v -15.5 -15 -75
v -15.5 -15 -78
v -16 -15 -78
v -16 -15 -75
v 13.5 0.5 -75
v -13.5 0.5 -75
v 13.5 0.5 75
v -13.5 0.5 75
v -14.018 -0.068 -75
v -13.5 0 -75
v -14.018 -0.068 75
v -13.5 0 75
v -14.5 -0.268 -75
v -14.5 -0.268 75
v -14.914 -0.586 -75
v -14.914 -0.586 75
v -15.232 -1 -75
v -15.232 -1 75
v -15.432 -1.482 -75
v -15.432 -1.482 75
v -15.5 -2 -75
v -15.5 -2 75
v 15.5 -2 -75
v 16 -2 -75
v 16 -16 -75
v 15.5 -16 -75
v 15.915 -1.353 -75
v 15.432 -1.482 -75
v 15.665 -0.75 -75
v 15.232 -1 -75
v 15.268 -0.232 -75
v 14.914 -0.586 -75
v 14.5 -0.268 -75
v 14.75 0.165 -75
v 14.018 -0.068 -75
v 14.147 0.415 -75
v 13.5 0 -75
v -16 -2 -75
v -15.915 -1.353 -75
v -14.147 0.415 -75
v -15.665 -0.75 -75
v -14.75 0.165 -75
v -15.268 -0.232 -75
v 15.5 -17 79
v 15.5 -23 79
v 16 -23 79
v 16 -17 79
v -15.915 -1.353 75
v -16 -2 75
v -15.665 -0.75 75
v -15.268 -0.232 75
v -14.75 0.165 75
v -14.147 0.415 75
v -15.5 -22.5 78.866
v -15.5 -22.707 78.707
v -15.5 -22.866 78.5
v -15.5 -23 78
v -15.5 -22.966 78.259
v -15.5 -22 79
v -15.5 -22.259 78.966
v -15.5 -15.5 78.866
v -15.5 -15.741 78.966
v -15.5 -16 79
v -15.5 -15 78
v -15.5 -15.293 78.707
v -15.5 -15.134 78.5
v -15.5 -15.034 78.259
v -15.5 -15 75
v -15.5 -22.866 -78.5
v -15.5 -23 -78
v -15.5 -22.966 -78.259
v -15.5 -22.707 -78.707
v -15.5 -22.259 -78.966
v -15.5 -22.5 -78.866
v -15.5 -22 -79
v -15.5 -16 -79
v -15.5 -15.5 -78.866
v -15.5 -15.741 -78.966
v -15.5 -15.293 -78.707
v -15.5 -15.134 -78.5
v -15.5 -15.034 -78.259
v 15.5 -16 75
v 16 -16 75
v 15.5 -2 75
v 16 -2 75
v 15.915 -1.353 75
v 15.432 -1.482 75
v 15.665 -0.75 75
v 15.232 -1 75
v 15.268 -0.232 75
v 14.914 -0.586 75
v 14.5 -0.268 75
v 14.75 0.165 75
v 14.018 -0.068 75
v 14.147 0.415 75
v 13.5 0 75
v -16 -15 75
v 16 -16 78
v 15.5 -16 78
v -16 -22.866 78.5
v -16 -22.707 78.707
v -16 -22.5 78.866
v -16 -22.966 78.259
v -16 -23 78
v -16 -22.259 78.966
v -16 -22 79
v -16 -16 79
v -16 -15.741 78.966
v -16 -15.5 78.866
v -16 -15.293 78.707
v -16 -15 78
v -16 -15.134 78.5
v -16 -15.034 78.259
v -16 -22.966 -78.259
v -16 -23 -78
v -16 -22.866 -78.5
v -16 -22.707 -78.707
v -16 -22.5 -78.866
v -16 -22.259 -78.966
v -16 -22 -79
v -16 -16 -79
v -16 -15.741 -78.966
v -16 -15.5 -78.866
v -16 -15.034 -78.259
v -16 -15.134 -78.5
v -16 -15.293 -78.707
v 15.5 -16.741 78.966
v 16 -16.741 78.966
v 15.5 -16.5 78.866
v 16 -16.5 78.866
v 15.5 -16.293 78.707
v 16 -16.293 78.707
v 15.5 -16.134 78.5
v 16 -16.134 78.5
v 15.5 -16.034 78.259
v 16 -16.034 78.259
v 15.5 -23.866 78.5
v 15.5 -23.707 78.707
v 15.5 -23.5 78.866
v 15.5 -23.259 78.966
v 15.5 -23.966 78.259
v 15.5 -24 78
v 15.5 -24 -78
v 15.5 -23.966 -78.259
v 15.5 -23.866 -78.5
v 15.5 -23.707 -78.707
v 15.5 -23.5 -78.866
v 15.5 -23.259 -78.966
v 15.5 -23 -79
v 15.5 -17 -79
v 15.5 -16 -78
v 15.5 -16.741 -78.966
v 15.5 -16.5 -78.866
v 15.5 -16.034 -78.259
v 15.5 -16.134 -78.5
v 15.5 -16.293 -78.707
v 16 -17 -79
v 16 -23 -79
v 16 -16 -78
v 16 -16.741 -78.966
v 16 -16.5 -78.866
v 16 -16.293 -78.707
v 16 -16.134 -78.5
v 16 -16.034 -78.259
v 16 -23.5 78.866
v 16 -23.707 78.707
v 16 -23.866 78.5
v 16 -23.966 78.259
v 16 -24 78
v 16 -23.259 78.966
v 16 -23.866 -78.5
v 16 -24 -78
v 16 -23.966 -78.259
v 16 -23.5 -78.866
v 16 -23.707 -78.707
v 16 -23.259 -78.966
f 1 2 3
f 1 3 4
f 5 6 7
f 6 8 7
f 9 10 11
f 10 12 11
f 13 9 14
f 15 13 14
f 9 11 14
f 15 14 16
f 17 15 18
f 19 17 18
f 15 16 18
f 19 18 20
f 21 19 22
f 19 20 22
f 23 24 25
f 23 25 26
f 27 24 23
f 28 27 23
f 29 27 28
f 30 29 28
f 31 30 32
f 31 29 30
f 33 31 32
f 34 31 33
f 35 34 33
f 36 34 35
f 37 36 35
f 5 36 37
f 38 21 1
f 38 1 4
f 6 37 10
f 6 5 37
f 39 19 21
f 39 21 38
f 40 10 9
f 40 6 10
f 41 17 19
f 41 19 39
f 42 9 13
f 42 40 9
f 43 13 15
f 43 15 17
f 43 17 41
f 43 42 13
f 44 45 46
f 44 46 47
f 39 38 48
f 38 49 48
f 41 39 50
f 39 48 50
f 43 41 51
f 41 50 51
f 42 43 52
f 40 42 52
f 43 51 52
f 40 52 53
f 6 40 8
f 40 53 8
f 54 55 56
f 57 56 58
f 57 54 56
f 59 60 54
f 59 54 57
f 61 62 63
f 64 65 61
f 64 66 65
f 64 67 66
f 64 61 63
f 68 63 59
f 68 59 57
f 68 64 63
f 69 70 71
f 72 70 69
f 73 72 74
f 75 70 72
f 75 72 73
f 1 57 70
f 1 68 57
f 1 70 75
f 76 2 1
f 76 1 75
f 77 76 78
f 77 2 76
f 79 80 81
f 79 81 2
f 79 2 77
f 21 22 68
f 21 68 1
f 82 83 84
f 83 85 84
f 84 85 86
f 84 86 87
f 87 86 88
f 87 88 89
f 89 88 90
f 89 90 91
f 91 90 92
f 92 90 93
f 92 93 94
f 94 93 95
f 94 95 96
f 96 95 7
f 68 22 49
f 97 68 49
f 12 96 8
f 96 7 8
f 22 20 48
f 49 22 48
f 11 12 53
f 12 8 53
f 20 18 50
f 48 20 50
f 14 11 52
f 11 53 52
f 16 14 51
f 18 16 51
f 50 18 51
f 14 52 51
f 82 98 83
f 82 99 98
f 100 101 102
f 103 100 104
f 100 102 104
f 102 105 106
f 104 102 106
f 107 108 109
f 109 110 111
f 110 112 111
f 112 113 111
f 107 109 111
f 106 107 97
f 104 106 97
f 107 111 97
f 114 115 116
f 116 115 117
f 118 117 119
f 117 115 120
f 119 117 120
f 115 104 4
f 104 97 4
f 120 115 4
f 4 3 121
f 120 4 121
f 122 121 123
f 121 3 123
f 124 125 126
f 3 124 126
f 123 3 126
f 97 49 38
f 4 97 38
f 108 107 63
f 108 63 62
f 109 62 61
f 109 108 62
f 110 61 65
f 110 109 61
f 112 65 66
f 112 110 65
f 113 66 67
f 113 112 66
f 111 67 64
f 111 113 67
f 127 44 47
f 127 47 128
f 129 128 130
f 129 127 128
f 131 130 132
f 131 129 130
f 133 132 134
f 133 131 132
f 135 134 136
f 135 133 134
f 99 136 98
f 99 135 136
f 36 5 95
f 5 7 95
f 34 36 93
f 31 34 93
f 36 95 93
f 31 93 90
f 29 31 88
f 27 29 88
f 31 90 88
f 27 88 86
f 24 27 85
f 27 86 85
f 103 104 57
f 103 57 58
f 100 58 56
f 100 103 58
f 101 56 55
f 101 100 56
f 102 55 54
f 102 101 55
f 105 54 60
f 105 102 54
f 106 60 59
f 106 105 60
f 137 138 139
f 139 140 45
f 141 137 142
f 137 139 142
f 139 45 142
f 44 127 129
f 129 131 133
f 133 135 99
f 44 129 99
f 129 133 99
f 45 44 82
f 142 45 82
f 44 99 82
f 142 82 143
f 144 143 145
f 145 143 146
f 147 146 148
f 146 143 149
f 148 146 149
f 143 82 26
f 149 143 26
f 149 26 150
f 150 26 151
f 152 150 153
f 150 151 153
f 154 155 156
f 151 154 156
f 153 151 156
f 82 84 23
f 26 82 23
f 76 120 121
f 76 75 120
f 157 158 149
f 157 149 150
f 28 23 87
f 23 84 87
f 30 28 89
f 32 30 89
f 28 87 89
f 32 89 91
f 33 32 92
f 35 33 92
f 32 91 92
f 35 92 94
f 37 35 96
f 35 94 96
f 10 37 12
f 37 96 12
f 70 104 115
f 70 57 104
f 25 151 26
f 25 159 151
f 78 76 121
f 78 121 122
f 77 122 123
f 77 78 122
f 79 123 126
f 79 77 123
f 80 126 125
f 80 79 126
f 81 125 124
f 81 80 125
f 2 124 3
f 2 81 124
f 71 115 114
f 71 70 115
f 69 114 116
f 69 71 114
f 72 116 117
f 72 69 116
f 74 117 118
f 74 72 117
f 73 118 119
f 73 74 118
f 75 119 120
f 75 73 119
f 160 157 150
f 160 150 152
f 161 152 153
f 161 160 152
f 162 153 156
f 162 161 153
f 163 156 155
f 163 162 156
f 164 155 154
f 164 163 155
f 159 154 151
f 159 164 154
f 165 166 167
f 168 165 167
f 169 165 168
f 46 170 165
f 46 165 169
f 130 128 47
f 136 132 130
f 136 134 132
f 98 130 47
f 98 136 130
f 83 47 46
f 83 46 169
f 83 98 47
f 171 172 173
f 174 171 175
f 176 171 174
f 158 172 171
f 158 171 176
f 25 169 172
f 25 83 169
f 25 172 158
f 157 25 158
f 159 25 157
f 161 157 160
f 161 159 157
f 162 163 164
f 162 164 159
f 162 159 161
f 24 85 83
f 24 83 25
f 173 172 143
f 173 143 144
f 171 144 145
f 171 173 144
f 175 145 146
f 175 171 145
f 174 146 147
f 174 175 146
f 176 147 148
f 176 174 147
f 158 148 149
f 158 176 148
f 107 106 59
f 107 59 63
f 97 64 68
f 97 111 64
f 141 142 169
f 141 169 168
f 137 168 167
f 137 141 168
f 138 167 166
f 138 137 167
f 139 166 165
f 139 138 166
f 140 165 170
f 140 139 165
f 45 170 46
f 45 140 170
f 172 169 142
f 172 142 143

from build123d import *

# Parameters (mm, degrees)
BOSS_EXTRUDE1_DEPTH = 75
BOSS_EXTRUDE2_DEPTH = 0.25
BOSS_EXTRUDE3_DEPTH = 0.25


with BuildPart() as part:
    # Sketch2 → Boss-Extrude1 (new, symmetric)
    with BuildSketch(Plane.XY):
        with BuildLine():
            Line((15.5, -24), (15.5, -2))
            ThreePointArc((15.5, -2), (14.914213562, -0.585786438), (13.5, 0))
            Line((13.5, 0), (-13.5, 0))
            ThreePointArc((-13.5, 0), (-14.914213562, -0.585786438), (-15.5, -2))
            Line((-15.5, -2), (-15.5, -23))
            Line((-15.5, -23), (-16, -23))
            Line((-16, -23), (-16, -2))
            ThreePointArc((-16, -2), (-15.267766953, -0.232233047), (-13.5, 0.5))
            Line((-13.5, 0.5), (13.5, 0.5))
            ThreePointArc((13.5, 0.5), (15.267766953, -0.232233047), (16, -2))
            Line((16, -2), (16, -24))
            Line((16, -24), (15.5, -24))
        make_face()
    extrude(amount=BOSS_EXTRUDE1_DEPTH, both=True)

    # Sketch3 → Boss-Extrude2 (add, symmetric)
    with BuildSketch(Plane(origin=(15.75, 0, 0), x_dir=(0, 0, -1), z_dir=(1, 0, 0))):
        with BuildLine():
            Line((-75, -24), (-78, -24))
            ThreePointArc((-78, -24), (-78.707106781, -23.707106781), (-79, -23))
            Line((-79, -23), (-79, -17))
            ThreePointArc((-79, -17), (-78.707106781, -16.292893219), (-78, -16))
            Line((-78, -16), (-75, -16))
            Line((-75, -16), (-75, -24))
        make_face()
        with BuildLine():
            Line((75, -24), (78, -24))
            ThreePointArc((78, -24), (78.707106781, -23.707106781), (79, -23))
            Line((79, -23), (79, -17))
            ThreePointArc((79, -17), (78.707106781, -16.292893219), (78, -16))
            Line((78, -16), (75, -16))
            Line((75, -16), (75, -24))
        make_face()
    extrude(amount=BOSS_EXTRUDE2_DEPTH, both=True)

    # Sketch4 → Boss-Extrude3 (add, symmetric)
    with BuildSketch(Plane(origin=(-15.75, 0, 0), x_dir=(0, 0, -1), z_dir=(1, 0, 0))):
        with BuildLine():
            Line((-75, -23), (-78, -23))
            ThreePointArc((-78, -23), (-78.707106781, -22.707106781), (-79, -22))
            Line((-79, -22), (-79, -16))
            ThreePointArc((-79, -16), (-78.707106781, -15.292893219), (-78, -15))
            Line((-78, -15), (-75, -15))
            Line((-75, -15), (-75, -23))
        make_face()
        with BuildLine():
            Line((79, -22), (79, -16))
            ThreePointArc((79, -16), (78.707106781, -15.292893219), (78, -15))
            Line((78, -15), (75, -15))
            Line((75, -15), (75, -23))
            Line((75, -23), (78, -23))
            ThreePointArc((78, -23), (78.707106781, -22.707106781), (79, -22))
        make_face()
    extrude(amount=BOSS_EXTRUDE3_DEPTH, both=True)


solid = part.part
